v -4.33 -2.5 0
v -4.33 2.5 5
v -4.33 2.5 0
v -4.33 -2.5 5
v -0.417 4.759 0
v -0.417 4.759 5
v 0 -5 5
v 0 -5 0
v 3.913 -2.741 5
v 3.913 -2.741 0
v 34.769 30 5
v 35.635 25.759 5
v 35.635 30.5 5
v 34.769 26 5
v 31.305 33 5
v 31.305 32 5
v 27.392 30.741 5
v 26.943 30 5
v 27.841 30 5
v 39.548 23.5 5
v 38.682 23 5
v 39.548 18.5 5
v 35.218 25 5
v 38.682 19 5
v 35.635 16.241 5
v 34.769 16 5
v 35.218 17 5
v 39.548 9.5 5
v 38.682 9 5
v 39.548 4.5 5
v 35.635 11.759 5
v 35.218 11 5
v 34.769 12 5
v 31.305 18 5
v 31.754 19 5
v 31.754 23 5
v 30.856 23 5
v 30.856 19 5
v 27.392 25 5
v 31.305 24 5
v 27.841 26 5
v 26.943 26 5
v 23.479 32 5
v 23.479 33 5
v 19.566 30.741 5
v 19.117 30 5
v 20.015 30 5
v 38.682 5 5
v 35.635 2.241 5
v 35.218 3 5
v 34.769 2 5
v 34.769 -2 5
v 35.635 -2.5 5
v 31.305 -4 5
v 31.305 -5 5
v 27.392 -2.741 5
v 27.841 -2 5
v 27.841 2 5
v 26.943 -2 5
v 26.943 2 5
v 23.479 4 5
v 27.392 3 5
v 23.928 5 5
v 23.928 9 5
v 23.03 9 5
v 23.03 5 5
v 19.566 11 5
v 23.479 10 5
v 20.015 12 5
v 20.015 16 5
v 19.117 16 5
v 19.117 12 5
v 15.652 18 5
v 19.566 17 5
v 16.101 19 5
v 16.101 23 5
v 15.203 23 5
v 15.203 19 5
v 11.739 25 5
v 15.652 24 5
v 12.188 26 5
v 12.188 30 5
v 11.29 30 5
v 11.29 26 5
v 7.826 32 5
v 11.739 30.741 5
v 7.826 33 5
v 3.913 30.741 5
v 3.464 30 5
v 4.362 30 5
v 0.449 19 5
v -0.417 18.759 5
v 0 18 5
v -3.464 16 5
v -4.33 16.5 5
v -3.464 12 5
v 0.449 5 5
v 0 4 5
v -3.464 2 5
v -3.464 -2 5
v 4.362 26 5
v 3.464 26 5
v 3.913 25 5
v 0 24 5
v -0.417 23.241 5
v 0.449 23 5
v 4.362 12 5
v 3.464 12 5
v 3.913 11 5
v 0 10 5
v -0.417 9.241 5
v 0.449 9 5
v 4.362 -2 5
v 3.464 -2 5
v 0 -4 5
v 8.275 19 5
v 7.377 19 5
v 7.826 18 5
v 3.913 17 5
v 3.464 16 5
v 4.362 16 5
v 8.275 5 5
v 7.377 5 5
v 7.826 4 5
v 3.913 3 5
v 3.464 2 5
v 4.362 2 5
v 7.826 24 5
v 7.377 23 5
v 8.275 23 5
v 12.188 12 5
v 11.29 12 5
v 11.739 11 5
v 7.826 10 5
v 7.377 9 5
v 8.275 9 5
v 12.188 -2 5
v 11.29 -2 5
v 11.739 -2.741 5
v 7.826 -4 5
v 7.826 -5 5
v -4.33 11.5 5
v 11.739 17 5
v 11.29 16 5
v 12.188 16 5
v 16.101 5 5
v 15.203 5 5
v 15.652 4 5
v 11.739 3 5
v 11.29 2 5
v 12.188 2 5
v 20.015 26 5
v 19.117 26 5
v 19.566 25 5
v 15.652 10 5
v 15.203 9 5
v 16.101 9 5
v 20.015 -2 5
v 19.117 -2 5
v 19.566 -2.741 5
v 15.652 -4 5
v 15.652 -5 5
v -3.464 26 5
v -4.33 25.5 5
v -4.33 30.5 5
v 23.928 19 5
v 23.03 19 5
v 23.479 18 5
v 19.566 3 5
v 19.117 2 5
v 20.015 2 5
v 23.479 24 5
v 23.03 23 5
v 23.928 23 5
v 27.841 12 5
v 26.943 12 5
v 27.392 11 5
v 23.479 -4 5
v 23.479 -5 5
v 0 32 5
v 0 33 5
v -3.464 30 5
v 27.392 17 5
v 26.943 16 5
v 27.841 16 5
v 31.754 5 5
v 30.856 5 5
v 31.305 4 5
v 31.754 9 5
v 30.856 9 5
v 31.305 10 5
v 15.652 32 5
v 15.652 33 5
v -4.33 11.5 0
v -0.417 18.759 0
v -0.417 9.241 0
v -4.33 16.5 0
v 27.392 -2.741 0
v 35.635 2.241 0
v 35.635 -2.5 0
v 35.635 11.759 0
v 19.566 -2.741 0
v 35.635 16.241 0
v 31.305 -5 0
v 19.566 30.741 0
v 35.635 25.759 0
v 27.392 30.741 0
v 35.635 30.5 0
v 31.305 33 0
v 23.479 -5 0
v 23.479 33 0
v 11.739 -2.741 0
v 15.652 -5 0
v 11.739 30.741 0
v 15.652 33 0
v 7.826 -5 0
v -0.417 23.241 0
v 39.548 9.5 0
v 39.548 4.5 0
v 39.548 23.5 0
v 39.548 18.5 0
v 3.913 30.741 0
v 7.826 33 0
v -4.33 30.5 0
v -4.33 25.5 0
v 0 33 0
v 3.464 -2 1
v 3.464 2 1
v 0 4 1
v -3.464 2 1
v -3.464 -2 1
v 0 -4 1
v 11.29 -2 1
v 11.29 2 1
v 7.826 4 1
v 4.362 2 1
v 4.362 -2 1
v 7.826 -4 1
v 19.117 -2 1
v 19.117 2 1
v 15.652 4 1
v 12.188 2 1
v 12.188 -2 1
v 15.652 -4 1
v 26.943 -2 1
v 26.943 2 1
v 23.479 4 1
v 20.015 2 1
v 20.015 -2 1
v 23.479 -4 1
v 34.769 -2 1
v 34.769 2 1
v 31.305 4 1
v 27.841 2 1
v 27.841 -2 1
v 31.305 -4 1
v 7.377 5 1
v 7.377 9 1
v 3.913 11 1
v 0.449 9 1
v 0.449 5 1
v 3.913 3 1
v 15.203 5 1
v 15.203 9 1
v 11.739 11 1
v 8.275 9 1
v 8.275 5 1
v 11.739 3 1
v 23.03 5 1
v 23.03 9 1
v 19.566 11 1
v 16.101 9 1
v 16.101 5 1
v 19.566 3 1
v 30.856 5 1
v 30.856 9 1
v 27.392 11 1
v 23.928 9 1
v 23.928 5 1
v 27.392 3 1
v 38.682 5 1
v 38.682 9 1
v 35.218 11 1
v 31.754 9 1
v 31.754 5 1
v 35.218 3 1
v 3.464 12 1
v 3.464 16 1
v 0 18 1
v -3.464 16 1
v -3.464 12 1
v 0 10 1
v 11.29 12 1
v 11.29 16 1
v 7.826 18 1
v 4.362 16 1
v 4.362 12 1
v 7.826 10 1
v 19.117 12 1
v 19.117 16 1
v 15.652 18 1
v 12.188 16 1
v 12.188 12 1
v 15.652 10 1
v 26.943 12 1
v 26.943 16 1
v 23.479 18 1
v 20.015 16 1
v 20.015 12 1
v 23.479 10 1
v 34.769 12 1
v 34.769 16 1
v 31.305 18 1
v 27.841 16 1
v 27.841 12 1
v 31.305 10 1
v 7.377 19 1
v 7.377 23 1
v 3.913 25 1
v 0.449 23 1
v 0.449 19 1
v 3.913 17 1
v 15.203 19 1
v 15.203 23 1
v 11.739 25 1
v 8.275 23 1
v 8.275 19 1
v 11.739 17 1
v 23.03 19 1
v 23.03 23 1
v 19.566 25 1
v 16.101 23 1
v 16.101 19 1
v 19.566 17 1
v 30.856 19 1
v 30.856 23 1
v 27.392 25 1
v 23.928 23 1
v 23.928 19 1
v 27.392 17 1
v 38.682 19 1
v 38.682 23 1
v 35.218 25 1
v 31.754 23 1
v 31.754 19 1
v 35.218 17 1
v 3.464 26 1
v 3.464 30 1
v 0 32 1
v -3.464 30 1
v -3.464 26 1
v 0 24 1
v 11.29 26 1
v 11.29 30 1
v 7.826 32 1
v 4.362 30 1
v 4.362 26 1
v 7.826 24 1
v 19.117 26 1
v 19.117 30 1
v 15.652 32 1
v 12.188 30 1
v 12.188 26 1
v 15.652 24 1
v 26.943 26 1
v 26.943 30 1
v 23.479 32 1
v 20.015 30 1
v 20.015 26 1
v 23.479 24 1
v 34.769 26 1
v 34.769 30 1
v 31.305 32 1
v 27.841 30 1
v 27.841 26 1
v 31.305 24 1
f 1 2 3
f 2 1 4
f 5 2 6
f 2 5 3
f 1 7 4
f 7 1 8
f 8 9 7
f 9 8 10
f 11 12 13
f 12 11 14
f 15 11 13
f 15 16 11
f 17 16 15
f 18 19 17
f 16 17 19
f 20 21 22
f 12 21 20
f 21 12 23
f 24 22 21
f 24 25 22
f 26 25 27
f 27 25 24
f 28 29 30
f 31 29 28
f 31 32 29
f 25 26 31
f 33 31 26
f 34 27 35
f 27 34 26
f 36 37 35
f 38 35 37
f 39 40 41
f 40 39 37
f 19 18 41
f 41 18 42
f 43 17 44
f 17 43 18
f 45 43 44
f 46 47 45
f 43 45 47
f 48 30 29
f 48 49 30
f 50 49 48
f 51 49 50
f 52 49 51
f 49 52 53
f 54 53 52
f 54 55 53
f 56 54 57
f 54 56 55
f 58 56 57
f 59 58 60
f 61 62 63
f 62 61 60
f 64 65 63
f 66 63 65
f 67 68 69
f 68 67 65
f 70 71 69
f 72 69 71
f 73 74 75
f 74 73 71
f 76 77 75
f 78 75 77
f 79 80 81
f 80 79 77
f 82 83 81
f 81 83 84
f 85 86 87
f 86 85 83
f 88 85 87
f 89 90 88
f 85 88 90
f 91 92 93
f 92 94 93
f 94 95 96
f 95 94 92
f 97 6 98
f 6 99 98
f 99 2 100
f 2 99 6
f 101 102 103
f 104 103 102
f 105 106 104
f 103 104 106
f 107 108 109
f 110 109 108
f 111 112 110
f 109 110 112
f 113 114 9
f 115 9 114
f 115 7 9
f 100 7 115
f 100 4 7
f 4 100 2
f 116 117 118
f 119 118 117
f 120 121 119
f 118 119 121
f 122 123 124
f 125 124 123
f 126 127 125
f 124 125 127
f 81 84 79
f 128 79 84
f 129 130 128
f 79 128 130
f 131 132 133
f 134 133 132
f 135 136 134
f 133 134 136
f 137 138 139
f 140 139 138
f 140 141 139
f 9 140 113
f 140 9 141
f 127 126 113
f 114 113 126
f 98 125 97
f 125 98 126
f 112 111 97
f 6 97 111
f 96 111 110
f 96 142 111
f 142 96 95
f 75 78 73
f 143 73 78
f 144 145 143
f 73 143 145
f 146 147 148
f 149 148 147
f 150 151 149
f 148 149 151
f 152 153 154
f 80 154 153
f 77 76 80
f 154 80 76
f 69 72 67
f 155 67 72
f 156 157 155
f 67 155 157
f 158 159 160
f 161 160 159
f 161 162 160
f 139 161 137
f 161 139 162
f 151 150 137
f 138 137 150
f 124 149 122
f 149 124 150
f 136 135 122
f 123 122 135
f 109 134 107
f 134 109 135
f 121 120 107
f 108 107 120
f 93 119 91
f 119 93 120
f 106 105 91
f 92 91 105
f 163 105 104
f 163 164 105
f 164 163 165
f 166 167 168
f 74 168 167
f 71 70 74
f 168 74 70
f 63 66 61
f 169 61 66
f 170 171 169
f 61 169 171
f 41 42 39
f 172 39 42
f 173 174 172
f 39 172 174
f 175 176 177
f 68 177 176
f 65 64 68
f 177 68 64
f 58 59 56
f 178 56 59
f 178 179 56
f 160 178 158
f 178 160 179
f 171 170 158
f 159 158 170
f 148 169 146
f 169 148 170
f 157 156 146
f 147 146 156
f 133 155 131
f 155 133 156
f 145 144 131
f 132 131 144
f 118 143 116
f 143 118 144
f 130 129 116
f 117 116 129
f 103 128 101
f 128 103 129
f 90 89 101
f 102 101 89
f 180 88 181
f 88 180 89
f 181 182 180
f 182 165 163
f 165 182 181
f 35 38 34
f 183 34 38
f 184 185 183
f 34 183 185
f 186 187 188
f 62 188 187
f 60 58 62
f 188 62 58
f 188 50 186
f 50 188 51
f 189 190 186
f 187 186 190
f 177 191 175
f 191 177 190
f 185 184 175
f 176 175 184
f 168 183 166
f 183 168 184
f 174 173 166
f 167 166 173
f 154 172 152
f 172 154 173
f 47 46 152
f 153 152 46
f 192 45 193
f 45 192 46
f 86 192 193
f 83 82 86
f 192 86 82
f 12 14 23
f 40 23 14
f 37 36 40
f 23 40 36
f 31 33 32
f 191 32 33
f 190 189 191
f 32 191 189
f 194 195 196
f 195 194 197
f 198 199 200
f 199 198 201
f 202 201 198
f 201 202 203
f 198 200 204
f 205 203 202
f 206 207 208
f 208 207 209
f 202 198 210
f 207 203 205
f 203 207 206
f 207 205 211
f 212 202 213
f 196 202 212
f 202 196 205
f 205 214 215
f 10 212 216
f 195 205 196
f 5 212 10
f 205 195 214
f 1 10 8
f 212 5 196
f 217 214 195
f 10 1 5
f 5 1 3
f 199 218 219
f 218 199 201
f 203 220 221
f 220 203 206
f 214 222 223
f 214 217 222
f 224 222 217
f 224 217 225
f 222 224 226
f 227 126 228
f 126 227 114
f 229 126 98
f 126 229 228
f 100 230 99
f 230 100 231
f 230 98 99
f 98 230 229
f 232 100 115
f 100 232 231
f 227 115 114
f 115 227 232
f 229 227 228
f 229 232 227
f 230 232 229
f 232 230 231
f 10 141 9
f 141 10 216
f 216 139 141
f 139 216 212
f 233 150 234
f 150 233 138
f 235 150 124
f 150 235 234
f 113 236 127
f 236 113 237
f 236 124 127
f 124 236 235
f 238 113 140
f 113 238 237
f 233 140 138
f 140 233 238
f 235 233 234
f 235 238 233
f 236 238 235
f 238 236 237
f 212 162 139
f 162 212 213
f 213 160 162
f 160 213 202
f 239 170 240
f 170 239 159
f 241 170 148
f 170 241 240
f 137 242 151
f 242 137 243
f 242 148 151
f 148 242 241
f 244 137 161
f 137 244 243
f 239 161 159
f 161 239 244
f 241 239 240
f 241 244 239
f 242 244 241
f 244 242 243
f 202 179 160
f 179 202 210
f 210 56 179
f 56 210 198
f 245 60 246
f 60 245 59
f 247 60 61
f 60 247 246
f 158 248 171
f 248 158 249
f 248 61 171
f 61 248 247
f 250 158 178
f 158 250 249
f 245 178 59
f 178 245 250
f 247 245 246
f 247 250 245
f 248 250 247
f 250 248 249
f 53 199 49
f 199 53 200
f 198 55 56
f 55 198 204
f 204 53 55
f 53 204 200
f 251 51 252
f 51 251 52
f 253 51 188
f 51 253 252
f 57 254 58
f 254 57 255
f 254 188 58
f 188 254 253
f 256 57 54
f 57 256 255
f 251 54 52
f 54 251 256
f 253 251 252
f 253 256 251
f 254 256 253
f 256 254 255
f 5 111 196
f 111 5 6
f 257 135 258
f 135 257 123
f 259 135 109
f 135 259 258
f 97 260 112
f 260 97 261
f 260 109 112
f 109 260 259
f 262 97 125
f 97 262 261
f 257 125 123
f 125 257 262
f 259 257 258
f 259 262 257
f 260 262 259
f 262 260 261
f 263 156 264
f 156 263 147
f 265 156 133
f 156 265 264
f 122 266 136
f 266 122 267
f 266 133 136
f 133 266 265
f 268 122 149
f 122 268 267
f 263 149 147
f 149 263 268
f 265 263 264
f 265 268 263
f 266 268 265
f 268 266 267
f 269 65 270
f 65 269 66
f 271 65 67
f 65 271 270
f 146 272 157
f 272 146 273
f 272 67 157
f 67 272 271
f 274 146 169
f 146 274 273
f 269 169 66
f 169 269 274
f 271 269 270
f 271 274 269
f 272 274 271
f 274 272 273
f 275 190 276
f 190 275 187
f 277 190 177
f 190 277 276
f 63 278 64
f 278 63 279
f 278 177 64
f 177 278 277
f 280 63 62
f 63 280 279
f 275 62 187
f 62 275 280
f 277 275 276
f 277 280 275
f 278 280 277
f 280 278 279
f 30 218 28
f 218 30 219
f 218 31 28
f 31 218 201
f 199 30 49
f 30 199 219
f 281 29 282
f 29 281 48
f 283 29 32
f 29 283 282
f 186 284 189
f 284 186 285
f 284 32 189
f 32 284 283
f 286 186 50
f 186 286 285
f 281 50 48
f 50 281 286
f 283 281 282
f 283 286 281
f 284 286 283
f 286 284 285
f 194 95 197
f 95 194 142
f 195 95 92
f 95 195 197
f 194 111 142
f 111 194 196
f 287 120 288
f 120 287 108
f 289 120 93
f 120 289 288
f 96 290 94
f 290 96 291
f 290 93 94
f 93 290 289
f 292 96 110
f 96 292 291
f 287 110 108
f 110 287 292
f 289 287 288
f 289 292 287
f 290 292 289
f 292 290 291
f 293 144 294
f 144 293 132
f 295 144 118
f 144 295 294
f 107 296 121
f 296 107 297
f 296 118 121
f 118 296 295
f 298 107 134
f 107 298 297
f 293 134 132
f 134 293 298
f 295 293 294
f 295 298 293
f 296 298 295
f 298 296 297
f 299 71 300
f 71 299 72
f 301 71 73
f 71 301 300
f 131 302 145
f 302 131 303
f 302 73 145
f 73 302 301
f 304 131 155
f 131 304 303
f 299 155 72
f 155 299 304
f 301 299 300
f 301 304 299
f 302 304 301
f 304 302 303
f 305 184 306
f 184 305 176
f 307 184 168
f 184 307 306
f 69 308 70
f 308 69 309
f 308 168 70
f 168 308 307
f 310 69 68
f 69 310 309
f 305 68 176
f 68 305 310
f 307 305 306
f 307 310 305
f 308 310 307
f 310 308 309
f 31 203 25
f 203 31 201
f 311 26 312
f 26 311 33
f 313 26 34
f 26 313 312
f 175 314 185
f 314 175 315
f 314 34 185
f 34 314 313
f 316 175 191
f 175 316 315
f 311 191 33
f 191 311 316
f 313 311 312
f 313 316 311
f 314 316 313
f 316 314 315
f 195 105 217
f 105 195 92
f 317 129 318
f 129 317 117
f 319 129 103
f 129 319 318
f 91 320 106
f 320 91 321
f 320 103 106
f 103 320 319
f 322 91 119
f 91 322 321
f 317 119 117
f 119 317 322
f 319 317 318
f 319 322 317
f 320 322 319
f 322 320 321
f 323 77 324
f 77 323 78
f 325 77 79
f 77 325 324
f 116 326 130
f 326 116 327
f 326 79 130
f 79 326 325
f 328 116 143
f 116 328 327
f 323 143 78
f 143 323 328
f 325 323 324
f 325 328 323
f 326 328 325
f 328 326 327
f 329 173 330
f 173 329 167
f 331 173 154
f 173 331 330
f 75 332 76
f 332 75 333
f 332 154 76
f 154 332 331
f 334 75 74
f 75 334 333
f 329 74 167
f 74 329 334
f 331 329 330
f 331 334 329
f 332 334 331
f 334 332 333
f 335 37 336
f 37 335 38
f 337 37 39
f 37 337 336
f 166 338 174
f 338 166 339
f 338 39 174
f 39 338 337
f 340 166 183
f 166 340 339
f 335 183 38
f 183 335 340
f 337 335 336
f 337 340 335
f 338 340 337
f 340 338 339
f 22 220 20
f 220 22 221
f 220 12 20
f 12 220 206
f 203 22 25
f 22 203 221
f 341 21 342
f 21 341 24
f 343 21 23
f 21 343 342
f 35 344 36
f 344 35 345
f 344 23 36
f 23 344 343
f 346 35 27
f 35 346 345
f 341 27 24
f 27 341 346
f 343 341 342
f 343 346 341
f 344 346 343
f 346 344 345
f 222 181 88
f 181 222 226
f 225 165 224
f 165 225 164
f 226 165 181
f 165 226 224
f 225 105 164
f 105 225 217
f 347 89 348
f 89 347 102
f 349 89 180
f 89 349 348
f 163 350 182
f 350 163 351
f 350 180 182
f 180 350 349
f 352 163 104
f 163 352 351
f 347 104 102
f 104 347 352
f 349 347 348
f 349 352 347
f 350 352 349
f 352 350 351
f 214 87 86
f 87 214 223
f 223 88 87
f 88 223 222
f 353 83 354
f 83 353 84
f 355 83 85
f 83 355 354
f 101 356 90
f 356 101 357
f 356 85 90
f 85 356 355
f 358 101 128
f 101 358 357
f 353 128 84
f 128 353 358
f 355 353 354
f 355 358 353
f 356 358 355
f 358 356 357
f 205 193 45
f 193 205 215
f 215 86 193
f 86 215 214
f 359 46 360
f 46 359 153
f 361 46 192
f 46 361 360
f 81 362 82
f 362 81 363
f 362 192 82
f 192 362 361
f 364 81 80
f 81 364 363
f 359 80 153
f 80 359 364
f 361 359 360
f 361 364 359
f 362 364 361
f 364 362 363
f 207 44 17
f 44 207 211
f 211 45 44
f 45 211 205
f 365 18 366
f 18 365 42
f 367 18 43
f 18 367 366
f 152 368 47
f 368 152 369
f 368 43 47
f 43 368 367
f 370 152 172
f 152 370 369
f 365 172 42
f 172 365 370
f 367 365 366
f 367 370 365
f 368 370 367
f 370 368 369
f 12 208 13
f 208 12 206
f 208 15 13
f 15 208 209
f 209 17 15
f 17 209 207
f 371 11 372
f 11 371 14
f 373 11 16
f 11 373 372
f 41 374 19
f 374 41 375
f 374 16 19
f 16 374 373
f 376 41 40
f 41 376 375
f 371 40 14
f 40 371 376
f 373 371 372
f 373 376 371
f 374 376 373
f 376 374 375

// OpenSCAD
// file: math.scad
///< Math scad module


///< Find the hypotenuse from two sides of a right triangle
function hyp_from_sides( a, b ) = sqrt( pow( a, 2 ) + pow( b, 2 ) );

///< Find equal sides from hypotenuse of a right triangle
function sides_from_hyp(h) = sqrt( pow( h, 2 ) / 2 );

///< Find A from hypotenuse and B
function a_from_hb( h, b ) = sqrt( pow( h, 2 ) - pow( b, 2 ) );

function dist_2d( pt2, pt1 ) = sqrt(pow(( pt2[0]-pt1[0] ),2) + pow(( pt2[1]-pt1[1]),2) );

function mid_pt_2d( pt2, pt1 ) = [( pt1[0]+pt2[0] )/2, ( pt1[1]+pt2[1] )/2, 0 ];
///< Test for math functions

A = 3;
B = 4;
echo("Given A=", A, "and B=", B );
H = hyp_from_sides( A, B );
echo("Hypotenuse=", H );
echo("Calc Correct = ", (H == 5) );

echo("Given H=", H, " which is a hypotenuse with equal sides" );
echo( "the sides=", sides_from_hyp( H ) );

echo("Given H=", H, "B=", 4 );
echo("A=", a_from_hb( H, 4 ) );

echo("Distance from [-1,1] and [3,4] = ", dist_2d( [-1,1],[3,4]) );
// main file
///< Honeycomb Generator
use <math.scad>;

///< Cell parameters mm

cell_height    = 5;
cell_radius    = 5;
cell_thickness = cell_radius * 0.20;
pack           = true;

///< Modules
module cell( height, radius, thickness=1, open=false ){
       z_adjust = open ? 0 : 1;
       r_adjust  = ( radius == thickness ) ? ( radius - ( radius -1 ) ) : thickness;
       difference(){
	cylinder( h=height, r=radius, $fn=6 );
	translate([0,0,z_adjust])color("blue",0.75)cylinder( h=height, r=radius-r_adjust, $fn=6 );
	}
}

module honeycomb( rows, cols, pack=true ) {
       ///< Simple HCP latice
       ///< ( https://en.wikipedia.org/wiki/Close-packing_of_equal_spheres#Simple_hcp_lattice )
       cellsize = pack ? cell_radius * 0.7 : cell_radius ;
       offset = hyp_from_sides( (cellsize * 2), cellsize );
       for( i = [0:rows-1] ){
       	    for( j = [0:cols-1] ){
	    	 translate( [ ( j * offset ) + ( i % 2 ) * (offset/2 ), i * ( cellsize * 2 ), 0 ] )
		 rotate( [0, 0, 90 ] ) ///< Rotate the cells so they are aligned
		 cell( cell_height, cell_radius, cell_thickness );
		 }
	}
}



///< Proto type
honeycomb( 5, 5, pack );
